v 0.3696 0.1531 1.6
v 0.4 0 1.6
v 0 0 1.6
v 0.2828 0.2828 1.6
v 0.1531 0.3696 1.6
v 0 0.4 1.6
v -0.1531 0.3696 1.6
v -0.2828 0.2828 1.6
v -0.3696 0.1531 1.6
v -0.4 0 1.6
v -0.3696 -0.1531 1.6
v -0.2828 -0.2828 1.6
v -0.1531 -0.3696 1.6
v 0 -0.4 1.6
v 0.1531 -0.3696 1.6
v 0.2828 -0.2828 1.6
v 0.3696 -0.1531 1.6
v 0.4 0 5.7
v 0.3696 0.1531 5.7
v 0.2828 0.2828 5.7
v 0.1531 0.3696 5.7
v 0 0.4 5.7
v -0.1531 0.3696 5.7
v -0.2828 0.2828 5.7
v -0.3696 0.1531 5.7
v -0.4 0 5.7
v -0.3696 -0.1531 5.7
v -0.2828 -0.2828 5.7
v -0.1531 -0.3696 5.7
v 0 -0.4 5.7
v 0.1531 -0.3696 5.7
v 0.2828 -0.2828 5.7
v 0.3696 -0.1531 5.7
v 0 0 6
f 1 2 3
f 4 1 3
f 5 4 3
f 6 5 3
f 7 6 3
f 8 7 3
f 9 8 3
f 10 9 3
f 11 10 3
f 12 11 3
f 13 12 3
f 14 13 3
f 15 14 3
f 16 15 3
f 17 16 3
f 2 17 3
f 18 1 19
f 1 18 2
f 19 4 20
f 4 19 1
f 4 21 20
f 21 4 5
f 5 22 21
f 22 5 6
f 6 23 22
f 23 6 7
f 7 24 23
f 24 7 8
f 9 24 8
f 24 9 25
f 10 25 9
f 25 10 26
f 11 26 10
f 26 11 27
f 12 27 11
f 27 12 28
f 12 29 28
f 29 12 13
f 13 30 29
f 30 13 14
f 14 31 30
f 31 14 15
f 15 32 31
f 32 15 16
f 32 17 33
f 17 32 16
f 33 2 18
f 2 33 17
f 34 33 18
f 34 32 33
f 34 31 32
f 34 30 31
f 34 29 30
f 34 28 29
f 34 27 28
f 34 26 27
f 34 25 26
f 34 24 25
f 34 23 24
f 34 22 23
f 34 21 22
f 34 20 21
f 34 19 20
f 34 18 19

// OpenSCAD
// file: ../../p/4-4edge.scad
use <../lib.scad>
function ldraw_lib__4_4edge() = [
// 0 Circle 1.0
// 0 Name: 4-4edge.dat
// 0 Author: James Jessiman
// 0 !LDRAW_ORG Primitive UPDATE 2017-01
// 0 !LICENSE Licensed under CC BY 4.0 : see CAreadme.txt
// 
// 0 BFC CERTIFY CCW
  [0,"BFC","CERTIFY"],
  [0,"BFC","CCW"],
// 
// 0 !HISTORY 1998-12-15 [PTadmin] Official Update 1998-10
// 0 !HISTORY 2005-12-28 [PTadmin] Official Update 2005-01
// 0 !HISTORY 2007-06-24 [PTadmin] Header formatted for Contributor Agreement
// 0 !HISTORY 2008-07-01 [PTadmin] Official Update 2008-01
// 0 !HISTORY 2017-01-15 [Steffen] BFCed
// 0 !HISTORY 2017-12-30 [PTadmin] Official Update 2017-01
// 
// 
// 2 24 1 0 0 0.9239 0 0.3827
  [2,24,1,0,0,0.9239,0,0.3827],
// 2 24 0.9239 0 0.3827 0.7071 0 0.7071
  [2,24,0.9239,0,0.3827,0.7071,0,0.7071],
// 2 24 0.7071 0 0.7071 0.3827 0 0.9239
  [2,24,0.7071,0,0.7071,0.3827,0,0.9239],
// 2 24 0.3827 0 0.9239 0 0 1
  [2,24,0.3827,0,0.9239,0,0,1],
// 2 24 0 0 1 -0.3827 0 0.9239
  [2,24,0,0,1,-0.3827,0,0.9239],
// 2 24 -0.3827 0 0.9239 -0.7071 0 0.7071
  [2,24,-0.3827,0,0.9239,-0.7071,0,0.7071],
// 2 24 -0.7071 0 0.7071 -0.9239 0 0.3827
  [2,24,-0.7071,0,0.7071,-0.9239,0,0.3827],
// 2 24 -0.9239 0 0.3827 -1 0 -0
  [2,24,-0.9239,0,0.3827,-1,0,-0],
// 2 24 -1 0 -0 -0.9239 0 -0.3827
  [2,24,-1,0,-0,-0.9239,0,-0.3827],
// 2 24 -0.9239 0 -0.3827 -0.7071 0 -0.7071
  [2,24,-0.9239,0,-0.3827,-0.7071,0,-0.7071],
// 2 24 -0.7071 0 -0.7071 -0.3827 0 -0.9239
  [2,24,-0.7071,0,-0.7071,-0.3827,0,-0.9239],
// 2 24 -0.3827 0 -0.9239 0 0 -1
  [2,24,-0.3827,0,-0.9239,0,0,-1],
// 2 24 0 0 -1 0.3827 0 -0.9239
  [2,24,0,0,-1,0.3827,0,-0.9239],
// 2 24 0.3827 0 -0.9239 0.7071 0 -0.7071
  [2,24,0.3827,0,-0.9239,0.7071,0,-0.7071],
// 2 24 0.7071 0 -0.7071 0.9239 0 -0.3827
  [2,24,0.7071,0,-0.7071,0.9239,0,-0.3827],
// 2 24 0.9239 0 -0.3827 1 0 0
  [2,24,0.9239,0,-0.3827,1,0,0],
];
module ldraw_lib__4_4edge(step=0, col=false, unit=2/5, alt=false, line=0.2, solid=!$preview)
    makepoly(ldraw_lib__4_4edge(), step=step, col=col, unit=unit, alt=alt, line=line, solid=solid);
ldraw_lib__4_4edge(line=0.2);
// file: ../../p/4-4disc.scad
use <../lib.scad>
function ldraw_lib__4_4disc() = [
// 0 Disc 1.0
// 0 Name: 4-4disc.dat
// 0 Author: James Jessiman
// 0 !LDRAW_ORG Primitive UPDATE 2002-02
// 0 !LICENSE Licensed under CC BY 4.0 : see CAreadme.txt
// 
// 0 BFC CERTIFY CCW
  [0,"BFC","CERTIFY"],
  [0,"BFC","CCW"],
// 
// 0 !HISTORY 1998-12-15 [PTadmin] Official Update 1998-10
// 0 !HISTORY 2002-03-23 [sbliss] Added BFC statement
// 0 !HISTORY 2002-04-25 [PTadmin] Official Update 2002-02
// 0 !HISTORY 2007-06-24 [PTadmin] Header formatted for Contributor Agreement
// 0 !HISTORY 2008-07-01 [PTadmin] Official Update 2008-01
// 
// 
// 3 16 0 0 0 1 0 0 0.9239 0 0.3827
  [3,16,0,0,0,1,0,0,0.9239,0,0.3827],
// 3 16 0 0 0 0.9239 0 0.3827 0.7071 0 0.7071
  [3,16,0,0,0,0.9239,0,0.3827,0.7071,0,0.7071],
// 3 16 0 0 0 0.7071 0 0.7071 0.3827 0 0.9239
  [3,16,0,0,0,0.7071,0,0.7071,0.3827,0,0.9239],
// 3 16 0 0 0 0.3827 0 0.9239 0 0 1
  [3,16,0,0,0,0.3827,0,0.9239,0,0,1],
// 3 16 0 0 0 0 0 1 -0.3827 0 0.9239
  [3,16,0,0,0,0,0,1,-0.3827,0,0.9239],
// 3 16 0 0 0 -0.3827 0 0.9239 -0.7071 0 0.7071
  [3,16,0,0,0,-0.3827,0,0.9239,-0.7071,0,0.7071],
// 3 16 0 0 0 -0.7071 0 0.7071 -0.9239 0 0.3827
  [3,16,0,0,0,-0.7071,0,0.7071,-0.9239,0,0.3827],
// 3 16 0 0 0 -0.9239 0 0.3827 -1 0 -0
  [3,16,0,0,0,-0.9239,0,0.3827,-1,0,-0],
// 3 16 0 0 0 -1 0 -0 -0.9239 0 -0.3827
  [3,16,0,0,0,-1,0,-0,-0.9239,0,-0.3827],
// 3 16 0 0 0 -0.9239 0 -0.3827 -0.7071 0 -0.7071
  [3,16,0,0,0,-0.9239,0,-0.3827,-0.7071,0,-0.7071],
// 3 16 0 0 0 -0.7071 0 -0.7071 -0.3827 0 -0.9239
  [3,16,0,0,0,-0.7071,0,-0.7071,-0.3827,0,-0.9239],
// 3 16 0 0 0 -0.3827 0 -0.9239 0 0 -1
  [3,16,0,0,0,-0.3827,0,-0.9239,0,0,-1],
// 3 16 0 0 0 0 0 -1 0.3827 0 -0.9239
  [3,16,0,0,0,0,0,-1,0.3827,0,-0.9239],
// 3 16 0 0 0 0.3827 0 -0.9239 0.7071 0 -0.7071
  [3,16,0,0,0,0.3827,0,-0.9239,0.7071,0,-0.7071],
// 3 16 0 0 0 0.7071 0 -0.7071 0.9239 0 -0.3827
  [3,16,0,0,0,0.7071,0,-0.7071,0.9239,0,-0.3827],
// 3 16 0 0 0 0.9239 0 -0.3827 1 0 0
  [3,16,0,0,0,0.9239,0,-0.3827,1,0,0],
// 0
];
module ldraw_lib__4_4disc(step=0, col=false, unit=2/5, alt=false, line=0.2, solid=!$preview)
    makepoly(ldraw_lib__4_4disc(), step=step, col=col, unit=unit, alt=alt, line=line, solid=solid);
ldraw_lib__4_4disc(line=0.2);
// file: ../../p/4-4cyli.scad
use <../lib.scad>
function ldraw_lib__4_4cyli() = [
// 0 Cylinder 1.0
// 0 Name: 4-4cyli.dat
// 0 Author: James Jessiman
// 0 !LDRAW_ORG Primitive UPDATE 2005-01
// 0 !LICENSE Licensed under CC BY 2.0 and CC BY 4.0 : see CAreadme.txt
// 
// 0 BFC CERTIFY CCW
  [0,"BFC","CERTIFY"],
  [0,"BFC","CCW"],
// 
// 0 !HISTORY 1998-12-15 [PTadmin] Official Update 1998-10
// 0 !HISTORY 2002-03-23 [sbliss] Added BFC statement; merged headers from files in distributions LDraw 0.27 and Complete.
// 0 !HISTORY 2002-04-25 [PTadmin] Official Update 2002-02
// 0 !HISTORY 2004-12-14 [guyvivan] BFC CCW
// 0 !HISTORY 2005-12-28 [PTadmin] Official Update 2005-01
// 0 !HISTORY 2007-06-24 [PTadmin] Header formatted for Contributor Agreement
// 0 !HISTORY 2008-07-01 [PTadmin] Official Update 2008-01
// 
// 
// 4 16 1 1 0 0.9239 1 0.3827 0.9239 0 0.3827 1 0 0
  [4,16,1,1,0,0.9239,1,0.3827,0.9239,0,0.3827,1,0,0],
// 5 24 1 0 0 1 1 0 0.9239 0 0.3827 0.9239 0 -0.3827
  [5,24,1,0,0,1,1,0,0.9239,0,0.3827,0.9239,0,-0.3827],
// 4 16 0.9239 1 0.3827 0.7071 1 0.7071 0.7071 0 0.7071 0.9239 0 0.3827
  [4,16,0.9239,1,0.3827,0.7071,1,0.7071,0.7071,0,0.7071,0.9239,0,0.3827],
// 5 24 0.9239 0 0.3827 0.9239 1 0.3827 0.7071 0 0.7071 1 0 0
  [5,24,0.9239,0,0.3827,0.9239,1,0.3827,0.7071,0,0.7071,1,0,0],
// 4 16 0.7071 1 0.7071 0.3827 1 0.9239 0.3827 0 0.9239 0.7071 0 0.7071
  [4,16,0.7071,1,0.7071,0.3827,1,0.9239,0.3827,0,0.9239,0.7071,0,0.7071],
// 5 24 0.7071 0 0.7071 0.7071 1 0.7071 0.3827 0 0.9239 0.9239 0 0.3827
  [5,24,0.7071,0,0.7071,0.7071,1,0.7071,0.3827,0,0.9239,0.9239,0,0.3827],
// 4 16 0.3827 1 0.9239 0 1 1 0 0 1 0.3827 0 0.9239
  [4,16,0.3827,1,0.9239,0,1,1,0,0,1,0.3827,0,0.9239],
// 5 24 0.3827 0 0.9239 0.3827 1 0.9239 0 0 1 0.7071 0 0.7071
  [5,24,0.3827,0,0.9239,0.3827,1,0.9239,0,0,1,0.7071,0,0.7071],
// 4 16 0 1 1 -0.3827 1 0.9239 -0.3827 0 0.9239 0 0 1
  [4,16,0,1,1,-0.3827,1,0.9239,-0.3827,0,0.9239,0,0,1],
// 5 24 0 0 1 0 1 1 -0.3827 0 0.9239 0.3827 0 0.9239
  [5,24,0,0,1,0,1,1,-0.3827,0,0.9239,0.3827,0,0.9239],
// 4 16 -0.3827 1 0.9239 -0.7071 1 0.7071 -0.7071 0 0.7071 -0.3827 0 0.9239
  [4,16,-0.3827,1,0.9239,-0.7071,1,0.7071,-0.7071,0,0.7071,-0.3827,0,0.9239],
// 5 24 -0.3827 0 0.9239 -0.3827 1 0.9239 -0.7071 0 0.7071 0 0 1
  [5,24,-0.3827,0,0.9239,-0.3827,1,0.9239,-0.7071,0,0.7071,0,0,1],
// 4 16 -0.7071 1 0.7071 -0.9239 1 0.3827 -0.9239 0 0.3827 -0.7071 0 0.7071
  [4,16,-0.7071,1,0.7071,-0.9239,1,0.3827,-0.9239,0,0.3827,-0.7071,0,0.7071],
// 5 24 -0.7071 0 0.7071 -0.7071 1 0.7071 -0.9239 0 0.3827 -0.3827 0 0.9239
  [5,24,-0.7071,0,0.7071,-0.7071,1,0.7071,-0.9239,0,0.3827,-0.3827,0,0.9239],
// 4 16 -0.9239 1 0.3827 -1 1 0 -1 0 0 -0.9239 0 0.3827
  [4,16,-0.9239,1,0.3827,-1,1,0,-1,0,0,-0.9239,0,0.3827],
// 5 24 -0.9239 0 0.3827 -0.9239 1 0.3827 -1 0 0 -0.7071 0 0.7071
  [5,24,-0.9239,0,0.3827,-0.9239,1,0.3827,-1,0,0,-0.7071,0,0.7071],
// 4 16 -1 1 0 -0.9239 1 -0.3827 -0.9239 0 -0.3827 -1 0 0
  [4,16,-1,1,0,-0.9239,1,-0.3827,-0.9239,0,-0.3827,-1,0,0],
// 5 24 -1 0 0 -1 1 0 -0.9239 0 -0.3827 -0.9239 0 0.3827
  [5,24,-1,0,0,-1,1,0,-0.9239,0,-0.3827,-0.9239,0,0.3827],
// 4 16 -0.9239 1 -0.3827 -0.7071 1 -0.7071 -0.7071 0 -0.7071 -0.9239 0 -0.3827
  [4,16,-0.9239,1,-0.3827,-0.7071,1,-0.7071,-0.7071,0,-0.7071,-0.9239,0,-0.3827],
// 5 24 -0.9239 0 -0.3827 -0.9239 1 -0.3827 -0.7071 0 -0.7071 -1 0 0
  [5,24,-0.9239,0,-0.3827,-0.9239,1,-0.3827,-0.7071,0,-0.7071,-1,0,0],
// 4 16 -0.7071 1 -0.7071 -0.3827 1 -0.9239 -0.3827 0 -0.9239 -0.7071 0 -0.7071
  [4,16,-0.7071,1,-0.7071,-0.3827,1,-0.9239,-0.3827,0,-0.9239,-0.7071,0,-0.7071],
// 5 24 -0.7071 0 -0.7071 -0.7071 1 -0.7071 -0.3827 0 -0.9239 -0.9239 0 -0.3827
  [5,24,-0.7071,0,-0.7071,-0.7071,1,-0.7071,-0.3827,0,-0.9239,-0.9239,0,-0.3827],
// 4 16 -0.3827 1 -0.9239 0 1 -1 0 0 -1 -0.3827 0 -0.9239
  [4,16,-0.3827,1,-0.9239,0,1,-1,0,0,-1,-0.3827,0,-0.9239],
// 5 24 -0.3827 0 -0.9239 -0.3827 1 -0.9239 0 0 -1 -0.7071 0 -0.7071
  [5,24,-0.3827,0,-0.9239,-0.3827,1,-0.9239,0,0,-1,-0.7071,0,-0.7071],
// 4 16 0 1 -1 0.3827 1 -0.9239 0.3827 0 -0.9239 0 0 -1
  [4,16,0,1,-1,0.3827,1,-0.9239,0.3827,0,-0.9239,0,0,-1],
// 5 24 0 0 -1 0 1 -1 0.3827 0 -0.9239 -0.3827 0 -0.9239
  [5,24,0,0,-1,0,1,-1,0.3827,0,-0.9239,-0.3827,0,-0.9239],
// 4 16 0.3827 1 -0.9239 0.7071 1 -0.7071 0.7071 0 -0.7071 0.3827 0 -0.9239
  [4,16,0.3827,1,-0.9239,0.7071,1,-0.7071,0.7071,0,-0.7071,0.3827,0,-0.9239],
// 5 24 0.3827 0 -0.9239 0.3827 1 -0.9239 0.7071 0 -0.7071 0 0 -1
  [5,24,0.3827,0,-0.9239,0.3827,1,-0.9239,0.7071,0,-0.7071,0,0,-1],
// 4 16 0.7071 1 -0.7071 0.9239 1 -0.3827 0.9239 0 -0.3827 0.7071 0 -0.7071
  [4,16,0.7071,1,-0.7071,0.9239,1,-0.3827,0.9239,0,-0.3827,0.7071,0,-0.7071],
// 5 24 0.7071 0 -0.7071 0.7071 1 -0.7071 0.9239 0 -0.3827 0.3827 0 -0.9239
  [5,24,0.7071,0,-0.7071,0.7071,1,-0.7071,0.9239,0,-0.3827,0.3827,0,-0.9239],
// 4 16 0.9239 1 -0.3827 1 1 0 1 0 0 0.9239 0 -0.3827
  [4,16,0.9239,1,-0.3827,1,1,0,1,0,0,0.9239,0,-0.3827],
// 5 24 0.9239 0 -0.3827 0.9239 1 -0.3827 1 0 0 0.7071 0 -0.7071
  [5,24,0.9239,0,-0.3827,0.9239,1,-0.3827,1,0,0,0.7071,0,-0.7071],
// 0
];
module ldraw_lib__4_4cyli(step=0, col=false, unit=2/5, alt=false, line=0.2, solid=!$preview)
    makepoly(ldraw_lib__4_4cyli(), step=step, col=col, unit=unit, alt=alt, line=line, solid=solid);
ldraw_lib__4_4cyli(line=0.2);
// file: ../../p/4-4cylc.scad
use <../lib.scad>
use <4-4cyli.scad>
use <4-4disc.scad>
use <4-4edge.scad>
function ldraw_lib__4_4cylc() = [
// 0 Cylinder Closed 1.0
// 0 Name: 4-4cylc.dat
// 0 Author: Alex Taylor [anathema]
// 0 !LDRAW_ORG Primitive UPDATE 2009-02
// 0 !LICENSE Licensed under CC BY 2.0 and CC BY 4.0 : see CAreadme.txt
// 
// 0 BFC CERTIFY CCW
  [0,"BFC","CERTIFY"],
  [0,"BFC","CCW"],
// 
// 0 !HISTORY 2008-12-29 [cwdee] Removed one disc
// 0 !HISTORY 2009-09-03 [PTadmin] Official Update 2009-02
// 
// 
// 1 16 0 0 0 1 0 0 0 1 0 0 0 1 4-4edge.dat
  [1,16,0,0,0,1,0,0,0,1,0,0,0,1, ldraw_lib__4_4edge()],
// 1 16 0 1 0 1 0 0 0 1 0 0 0 1 4-4edge.dat
  [1,16,0,1,0,1,0,0,0,1,0,0,0,1, ldraw_lib__4_4edge()],
// 1 16 0 0 0 1 0 0 0 1 0 0 0 1 4-4disc.dat
  [1,16,0,0,0,1,0,0,0,1,0,0,0,1, ldraw_lib__4_4disc()],
// 1 16 0 0 0 1 0 0 0 1 0 0 0 1 4-4cyli.dat
  [1,16,0,0,0,1,0,0,0,1,0,0,0,1, ldraw_lib__4_4cyli()],
// 0
];
module ldraw_lib__4_4cylc(step=0, col=false, unit=2/5, alt=false, line=0.2, solid=!$preview)
    makepoly(ldraw_lib__4_4cylc(), step=step, col=col, unit=unit, alt=alt, line=line, solid=solid);
ldraw_lib__4_4cylc(line=0.2);
// file: ../../p/4-4con0.scad
use <../lib.scad>
function ldraw_lib__4_4con0() = [
// 0 Cone  0 x 1.0
// 0 Name: 4-4con0.dat
// 0 Author: William Howard [WilliamH]
// 0 !LDRAW_ORG Primitive UPDATE 2009-03
// 0 !LICENSE Licensed under CC BY 2.0 and CC BY 4.0 : see CAreadme.txt
// 
// 0 BFC CERTIFY CCW
  [0,"BFC","CERTIFY"],
  [0,"BFC","CCW"],
// 
// 0 !HISTORY 2009-12-29 [PTadmin] Official Update 2009-03
// 
// 
// 3 16 0 1 0 0.9239 0 0.3827 1 0 0
  [3,16,0,1,0,0.9239,0,0.3827,1,0,0],
// 3 16 0 1 0 0.7071 0 0.7071 0.9239 0 0.3827
  [3,16,0,1,0,0.7071,0,0.7071,0.9239,0,0.3827],
// 3 16 0 1 0 0.3827 0 0.9239 0.7071 0 0.7071
  [3,16,0,1,0,0.3827,0,0.9239,0.7071,0,0.7071],
// 3 16 0 1 0 0 0 1 0.3827 0 0.9239
  [3,16,0,1,0,0,0,1,0.3827,0,0.9239],
// 3 16 0 1 0 -0.3827 0 0.9239 0 0 1
  [3,16,0,1,0,-0.3827,0,0.9239,0,0,1],
// 3 16 0 1 0 -0.7071 0 0.7071 -0.3827 0 0.9239
  [3,16,0,1,0,-0.7071,0,0.7071,-0.3827,0,0.9239],
// 3 16 0 1 0 -0.9239 0 0.3827 -0.7071 0 0.7071
  [3,16,0,1,0,-0.9239,0,0.3827,-0.7071,0,0.7071],
// 3 16 0 1 0 -1 0 0 -0.9239 0 0.3827
  [3,16,0,1,0,-1,0,0,-0.9239,0,0.3827],
// 3 16 0 1 0 -0.9239 0 -0.3827 -1 0 0
  [3,16,0,1,0,-0.9239,0,-0.3827,-1,0,0],
// 3 16 0 1 0 -0.7071 0 -0.7071 -0.9239 0 -0.3827
  [3,16,0,1,0,-0.7071,0,-0.7071,-0.9239,0,-0.3827],
// 3 16 0 1 0 -0.3827 0 -0.9239 -0.7071 0 -0.7071
  [3,16,0,1,0,-0.3827,0,-0.9239,-0.7071,0,-0.7071],
// 3 16 0 1 0 0 0 -1 -0.3827 0 -0.9239
  [3,16,0,1,0,0,0,-1,-0.3827,0,-0.9239],
// 3 16 0 1 0 0.3827 0 -0.9239 0 0 -1
  [3,16,0,1,0,0.3827,0,-0.9239,0,0,-1],
// 3 16 0 1 0 0.7071 0 -0.7071 0.3827 0 -0.9239
  [3,16,0,1,0,0.7071,0,-0.7071,0.3827,0,-0.9239],
// 3 16 0 1 0 0.9239 0 -0.3827 0.7071 0 -0.7071
  [3,16,0,1,0,0.9239,0,-0.3827,0.7071,0,-0.7071],
// 3 16 0 1 0 1 0 0 0.9239 0 -0.3827
  [3,16,0,1,0,1,0,0,0.9239,0,-0.3827],
// 
// 0 conditional lines
// 5 24 0 1 0 1 0 0 0.9239 0 -0.3827 0.9239 0 0.3827
  [5,24,0,1,0,1,0,0,0.9239,0,-0.3827,0.9239,0,0.3827],
// 5 24 0 1 0 0.9239 0 0.3827 1 0 0 0.7071 0 0.7071
  [5,24,0,1,0,0.9239,0,0.3827,1,0,0,0.7071,0,0.7071],
// 5 24 0 1 0 0.7071 0 0.7071 0.9239 0 0.3827 0.3827 0 0.9239
  [5,24,0,1,0,0.7071,0,0.7071,0.9239,0,0.3827,0.3827,0,0.9239],
// 5 24 0 1 0 0.3827 0 0.9239 0.7071 0 0.7071 0 0 1
  [5,24,0,1,0,0.3827,0,0.9239,0.7071,0,0.7071,0,0,1],
// 5 24 0 1 0 0 0 1 0.3827 0 0.9239 -0.3827 0 0.9239
  [5,24,0,1,0,0,0,1,0.3827,0,0.9239,-0.3827,0,0.9239],
// 5 24 0 1 0 -0.3827 0 0.9239 0 0 1 -0.7071 0 0.7071
  [5,24,0,1,0,-0.3827,0,0.9239,0,0,1,-0.7071,0,0.7071],
// 5 24 0 1 0 -0.7071 0 0.7071 -0.3827 0 0.9239 -0.9239 0 0.3827
  [5,24,0,1,0,-0.7071,0,0.7071,-0.3827,0,0.9239,-0.9239,0,0.3827],
// 5 24 0 1 0 -0.9239 0 0.3827 -0.7071 0 0.7071 -1 0 0
  [5,24,0,1,0,-0.9239,0,0.3827,-0.7071,0,0.7071,-1,0,0],
// 5 24 0 1 0 -1 0 0 -0.9239 0 0.3827 -0.9239 0 -0.3827
  [5,24,0,1,0,-1,0,0,-0.9239,0,0.3827,-0.9239,0,-0.3827],
// 5 24 0 1 0 -0.9239 0 -0.3827 -1 0 0 -0.7071 0 -0.7071
  [5,24,0,1,0,-0.9239,0,-0.3827,-1,0,0,-0.7071,0,-0.7071],
// 5 24 0 1 0 -0.7071 0 -0.7071 -0.9239 0 -0.3827 -0.3827 0 -0.9239
  [5,24,0,1,0,-0.7071,0,-0.7071,-0.9239,0,-0.3827,-0.3827,0,-0.9239],
// 5 24 0 1 0 -0.3827 0 -0.9239 -0.7071 0 -0.7071 0 0 -1
  [5,24,0,1,0,-0.3827,0,-0.9239,-0.7071,0,-0.7071,0,0,-1],
// 5 24 0 1 0 0 0 -1 -0.3827 0 -0.9239 0.3827 0 -0.9239
  [5,24,0,1,0,0,0,-1,-0.3827,0,-0.9239,0.3827,0,-0.9239],
// 5 24 0 1 0 0.3827 0 -0.9239 0 0 -1 0.7071 0 -0.7071
  [5,24,0,1,0,0.3827,0,-0.9239,0,0,-1,0.7071,0,-0.7071],
// 5 24 0 1 0 0.7071 0 -0.7071 0.3827 0 -0.9239 0.9239 0 -0.3827
  [5,24,0,1,0,0.7071,0,-0.7071,0.3827,0,-0.9239,0.9239,0,-0.3827],
// 5 24 0 1 0 0.9239 0 -0.3827 0.7071 0 -0.7071 1 0 0
  [5,24,0,1,0,0.9239,0,-0.3827,0.7071,0,-0.7071,1,0,0],
// 
// 0 end of file
];
module ldraw_lib__4_4con0(step=0, col=false, unit=2/5, alt=false, line=0.2, solid=!$preview)
    makepoly(ldraw_lib__4_4con0(), step=step, col=col, unit=unit, alt=alt, line=line, solid=solid);
ldraw_lib__4_4con0(line=0.2);
// file: ../70926.scad
use <../lib.scad>
use <../p/4-4con0.scad>
use <../p/4-4cylc.scad>
function ldraw_lib__70926() = [
// 0 ~Minifig Compass Base Stick
// 0 Name: 70926.dat
// 0 Author: Michael Heidemann [mikeheide]
// 0 !LDRAW_ORG Part UPDATE 2020-01
// 0 !LICENSE Licensed under CC BY 4.0 : see CAreadme.txt
// 
// 0 BFC CERTIFY CCW
  [0,"BFC","CERTIFY"],
  [0,"BFC","CCW"],
// 
// 0 !HISTORY 2010-07-05 [PTadmin] Official Update 2010-02
// 0 !HISTORY 2018-06-02 [MagFors] Renamed from s\889s01
// 0 !HISTORY 2020-06-28 [PTadmin] Official Update 2020-01
// 
// 
// 1 16 0 -4 0 1 0 0 0 -10.25 0 0 0 1 4-4cylc.dat
  [1,16,0,-4,0,1,0,0,0,-10.25,0,0,0,1, ldraw_lib__4_4cylc()],
// 1 16 0 -14.25 0 1 0 0 0 -.75 0 0 0 -1 4-4con0.dat
  [1,16,0,-14.25,0,1,0,0,0,-.75,0,0,0,-1, ldraw_lib__4_4con0()],
];
module ldraw_lib__70926(step=0, col=false, unit=2/5, alt=false, line=0.2, solid=!$preview)
    makepoly(ldraw_lib__70926(), step=step, col=col, unit=unit, alt=alt, line=line, solid=solid);
ldraw_lib__70926(line=0.2);
// main file
use <../../lib.scad>
use <../70926.scad>
function ldraw_lib__s__889s01() = [
// 0 ~Moved to 70926
// 0 Name: s\889s01.dat
// 0 Author: [PTadmin]
// 0 !LDRAW_ORG Subpart UPDATE 2020-01
// 0 !LICENSE Licensed under CC BY 4.0 : see CAreadme.txt
// 
// 0 BFC CERTIFY CCW
  [0,"BFC","CERTIFY"],
  [0,"BFC","CCW"],
// 
// 0 !HISTORY 2010-07-05 [PTadmin] Official Update 2010-02
// 0 !HISTORY 2018-06-02 [MagFors] Moved to 70926
// 0 !HISTORY 2020-06-28 [PTadmin] Official Update 2020-01
// 
// 
// 0 // Minifig Compass Base Stick
// 1 16 0 0 0 1 0 0 0 1 0 0 0 1 70926.dat
  [1,16,0,0,0,1,0,0,0,1,0,0,0,1, ldraw_lib__70926()],
];
module ldraw_lib__s__889s01(step=0, col=false, unit=2/5, alt=false, line=0.2, solid=!$preview)
    makepoly(ldraw_lib__s__889s01(), step=step, col=col, unit=unit, alt=alt, line=line, solid=solid);
ldraw_lib__s__889s01(line=0.2);
